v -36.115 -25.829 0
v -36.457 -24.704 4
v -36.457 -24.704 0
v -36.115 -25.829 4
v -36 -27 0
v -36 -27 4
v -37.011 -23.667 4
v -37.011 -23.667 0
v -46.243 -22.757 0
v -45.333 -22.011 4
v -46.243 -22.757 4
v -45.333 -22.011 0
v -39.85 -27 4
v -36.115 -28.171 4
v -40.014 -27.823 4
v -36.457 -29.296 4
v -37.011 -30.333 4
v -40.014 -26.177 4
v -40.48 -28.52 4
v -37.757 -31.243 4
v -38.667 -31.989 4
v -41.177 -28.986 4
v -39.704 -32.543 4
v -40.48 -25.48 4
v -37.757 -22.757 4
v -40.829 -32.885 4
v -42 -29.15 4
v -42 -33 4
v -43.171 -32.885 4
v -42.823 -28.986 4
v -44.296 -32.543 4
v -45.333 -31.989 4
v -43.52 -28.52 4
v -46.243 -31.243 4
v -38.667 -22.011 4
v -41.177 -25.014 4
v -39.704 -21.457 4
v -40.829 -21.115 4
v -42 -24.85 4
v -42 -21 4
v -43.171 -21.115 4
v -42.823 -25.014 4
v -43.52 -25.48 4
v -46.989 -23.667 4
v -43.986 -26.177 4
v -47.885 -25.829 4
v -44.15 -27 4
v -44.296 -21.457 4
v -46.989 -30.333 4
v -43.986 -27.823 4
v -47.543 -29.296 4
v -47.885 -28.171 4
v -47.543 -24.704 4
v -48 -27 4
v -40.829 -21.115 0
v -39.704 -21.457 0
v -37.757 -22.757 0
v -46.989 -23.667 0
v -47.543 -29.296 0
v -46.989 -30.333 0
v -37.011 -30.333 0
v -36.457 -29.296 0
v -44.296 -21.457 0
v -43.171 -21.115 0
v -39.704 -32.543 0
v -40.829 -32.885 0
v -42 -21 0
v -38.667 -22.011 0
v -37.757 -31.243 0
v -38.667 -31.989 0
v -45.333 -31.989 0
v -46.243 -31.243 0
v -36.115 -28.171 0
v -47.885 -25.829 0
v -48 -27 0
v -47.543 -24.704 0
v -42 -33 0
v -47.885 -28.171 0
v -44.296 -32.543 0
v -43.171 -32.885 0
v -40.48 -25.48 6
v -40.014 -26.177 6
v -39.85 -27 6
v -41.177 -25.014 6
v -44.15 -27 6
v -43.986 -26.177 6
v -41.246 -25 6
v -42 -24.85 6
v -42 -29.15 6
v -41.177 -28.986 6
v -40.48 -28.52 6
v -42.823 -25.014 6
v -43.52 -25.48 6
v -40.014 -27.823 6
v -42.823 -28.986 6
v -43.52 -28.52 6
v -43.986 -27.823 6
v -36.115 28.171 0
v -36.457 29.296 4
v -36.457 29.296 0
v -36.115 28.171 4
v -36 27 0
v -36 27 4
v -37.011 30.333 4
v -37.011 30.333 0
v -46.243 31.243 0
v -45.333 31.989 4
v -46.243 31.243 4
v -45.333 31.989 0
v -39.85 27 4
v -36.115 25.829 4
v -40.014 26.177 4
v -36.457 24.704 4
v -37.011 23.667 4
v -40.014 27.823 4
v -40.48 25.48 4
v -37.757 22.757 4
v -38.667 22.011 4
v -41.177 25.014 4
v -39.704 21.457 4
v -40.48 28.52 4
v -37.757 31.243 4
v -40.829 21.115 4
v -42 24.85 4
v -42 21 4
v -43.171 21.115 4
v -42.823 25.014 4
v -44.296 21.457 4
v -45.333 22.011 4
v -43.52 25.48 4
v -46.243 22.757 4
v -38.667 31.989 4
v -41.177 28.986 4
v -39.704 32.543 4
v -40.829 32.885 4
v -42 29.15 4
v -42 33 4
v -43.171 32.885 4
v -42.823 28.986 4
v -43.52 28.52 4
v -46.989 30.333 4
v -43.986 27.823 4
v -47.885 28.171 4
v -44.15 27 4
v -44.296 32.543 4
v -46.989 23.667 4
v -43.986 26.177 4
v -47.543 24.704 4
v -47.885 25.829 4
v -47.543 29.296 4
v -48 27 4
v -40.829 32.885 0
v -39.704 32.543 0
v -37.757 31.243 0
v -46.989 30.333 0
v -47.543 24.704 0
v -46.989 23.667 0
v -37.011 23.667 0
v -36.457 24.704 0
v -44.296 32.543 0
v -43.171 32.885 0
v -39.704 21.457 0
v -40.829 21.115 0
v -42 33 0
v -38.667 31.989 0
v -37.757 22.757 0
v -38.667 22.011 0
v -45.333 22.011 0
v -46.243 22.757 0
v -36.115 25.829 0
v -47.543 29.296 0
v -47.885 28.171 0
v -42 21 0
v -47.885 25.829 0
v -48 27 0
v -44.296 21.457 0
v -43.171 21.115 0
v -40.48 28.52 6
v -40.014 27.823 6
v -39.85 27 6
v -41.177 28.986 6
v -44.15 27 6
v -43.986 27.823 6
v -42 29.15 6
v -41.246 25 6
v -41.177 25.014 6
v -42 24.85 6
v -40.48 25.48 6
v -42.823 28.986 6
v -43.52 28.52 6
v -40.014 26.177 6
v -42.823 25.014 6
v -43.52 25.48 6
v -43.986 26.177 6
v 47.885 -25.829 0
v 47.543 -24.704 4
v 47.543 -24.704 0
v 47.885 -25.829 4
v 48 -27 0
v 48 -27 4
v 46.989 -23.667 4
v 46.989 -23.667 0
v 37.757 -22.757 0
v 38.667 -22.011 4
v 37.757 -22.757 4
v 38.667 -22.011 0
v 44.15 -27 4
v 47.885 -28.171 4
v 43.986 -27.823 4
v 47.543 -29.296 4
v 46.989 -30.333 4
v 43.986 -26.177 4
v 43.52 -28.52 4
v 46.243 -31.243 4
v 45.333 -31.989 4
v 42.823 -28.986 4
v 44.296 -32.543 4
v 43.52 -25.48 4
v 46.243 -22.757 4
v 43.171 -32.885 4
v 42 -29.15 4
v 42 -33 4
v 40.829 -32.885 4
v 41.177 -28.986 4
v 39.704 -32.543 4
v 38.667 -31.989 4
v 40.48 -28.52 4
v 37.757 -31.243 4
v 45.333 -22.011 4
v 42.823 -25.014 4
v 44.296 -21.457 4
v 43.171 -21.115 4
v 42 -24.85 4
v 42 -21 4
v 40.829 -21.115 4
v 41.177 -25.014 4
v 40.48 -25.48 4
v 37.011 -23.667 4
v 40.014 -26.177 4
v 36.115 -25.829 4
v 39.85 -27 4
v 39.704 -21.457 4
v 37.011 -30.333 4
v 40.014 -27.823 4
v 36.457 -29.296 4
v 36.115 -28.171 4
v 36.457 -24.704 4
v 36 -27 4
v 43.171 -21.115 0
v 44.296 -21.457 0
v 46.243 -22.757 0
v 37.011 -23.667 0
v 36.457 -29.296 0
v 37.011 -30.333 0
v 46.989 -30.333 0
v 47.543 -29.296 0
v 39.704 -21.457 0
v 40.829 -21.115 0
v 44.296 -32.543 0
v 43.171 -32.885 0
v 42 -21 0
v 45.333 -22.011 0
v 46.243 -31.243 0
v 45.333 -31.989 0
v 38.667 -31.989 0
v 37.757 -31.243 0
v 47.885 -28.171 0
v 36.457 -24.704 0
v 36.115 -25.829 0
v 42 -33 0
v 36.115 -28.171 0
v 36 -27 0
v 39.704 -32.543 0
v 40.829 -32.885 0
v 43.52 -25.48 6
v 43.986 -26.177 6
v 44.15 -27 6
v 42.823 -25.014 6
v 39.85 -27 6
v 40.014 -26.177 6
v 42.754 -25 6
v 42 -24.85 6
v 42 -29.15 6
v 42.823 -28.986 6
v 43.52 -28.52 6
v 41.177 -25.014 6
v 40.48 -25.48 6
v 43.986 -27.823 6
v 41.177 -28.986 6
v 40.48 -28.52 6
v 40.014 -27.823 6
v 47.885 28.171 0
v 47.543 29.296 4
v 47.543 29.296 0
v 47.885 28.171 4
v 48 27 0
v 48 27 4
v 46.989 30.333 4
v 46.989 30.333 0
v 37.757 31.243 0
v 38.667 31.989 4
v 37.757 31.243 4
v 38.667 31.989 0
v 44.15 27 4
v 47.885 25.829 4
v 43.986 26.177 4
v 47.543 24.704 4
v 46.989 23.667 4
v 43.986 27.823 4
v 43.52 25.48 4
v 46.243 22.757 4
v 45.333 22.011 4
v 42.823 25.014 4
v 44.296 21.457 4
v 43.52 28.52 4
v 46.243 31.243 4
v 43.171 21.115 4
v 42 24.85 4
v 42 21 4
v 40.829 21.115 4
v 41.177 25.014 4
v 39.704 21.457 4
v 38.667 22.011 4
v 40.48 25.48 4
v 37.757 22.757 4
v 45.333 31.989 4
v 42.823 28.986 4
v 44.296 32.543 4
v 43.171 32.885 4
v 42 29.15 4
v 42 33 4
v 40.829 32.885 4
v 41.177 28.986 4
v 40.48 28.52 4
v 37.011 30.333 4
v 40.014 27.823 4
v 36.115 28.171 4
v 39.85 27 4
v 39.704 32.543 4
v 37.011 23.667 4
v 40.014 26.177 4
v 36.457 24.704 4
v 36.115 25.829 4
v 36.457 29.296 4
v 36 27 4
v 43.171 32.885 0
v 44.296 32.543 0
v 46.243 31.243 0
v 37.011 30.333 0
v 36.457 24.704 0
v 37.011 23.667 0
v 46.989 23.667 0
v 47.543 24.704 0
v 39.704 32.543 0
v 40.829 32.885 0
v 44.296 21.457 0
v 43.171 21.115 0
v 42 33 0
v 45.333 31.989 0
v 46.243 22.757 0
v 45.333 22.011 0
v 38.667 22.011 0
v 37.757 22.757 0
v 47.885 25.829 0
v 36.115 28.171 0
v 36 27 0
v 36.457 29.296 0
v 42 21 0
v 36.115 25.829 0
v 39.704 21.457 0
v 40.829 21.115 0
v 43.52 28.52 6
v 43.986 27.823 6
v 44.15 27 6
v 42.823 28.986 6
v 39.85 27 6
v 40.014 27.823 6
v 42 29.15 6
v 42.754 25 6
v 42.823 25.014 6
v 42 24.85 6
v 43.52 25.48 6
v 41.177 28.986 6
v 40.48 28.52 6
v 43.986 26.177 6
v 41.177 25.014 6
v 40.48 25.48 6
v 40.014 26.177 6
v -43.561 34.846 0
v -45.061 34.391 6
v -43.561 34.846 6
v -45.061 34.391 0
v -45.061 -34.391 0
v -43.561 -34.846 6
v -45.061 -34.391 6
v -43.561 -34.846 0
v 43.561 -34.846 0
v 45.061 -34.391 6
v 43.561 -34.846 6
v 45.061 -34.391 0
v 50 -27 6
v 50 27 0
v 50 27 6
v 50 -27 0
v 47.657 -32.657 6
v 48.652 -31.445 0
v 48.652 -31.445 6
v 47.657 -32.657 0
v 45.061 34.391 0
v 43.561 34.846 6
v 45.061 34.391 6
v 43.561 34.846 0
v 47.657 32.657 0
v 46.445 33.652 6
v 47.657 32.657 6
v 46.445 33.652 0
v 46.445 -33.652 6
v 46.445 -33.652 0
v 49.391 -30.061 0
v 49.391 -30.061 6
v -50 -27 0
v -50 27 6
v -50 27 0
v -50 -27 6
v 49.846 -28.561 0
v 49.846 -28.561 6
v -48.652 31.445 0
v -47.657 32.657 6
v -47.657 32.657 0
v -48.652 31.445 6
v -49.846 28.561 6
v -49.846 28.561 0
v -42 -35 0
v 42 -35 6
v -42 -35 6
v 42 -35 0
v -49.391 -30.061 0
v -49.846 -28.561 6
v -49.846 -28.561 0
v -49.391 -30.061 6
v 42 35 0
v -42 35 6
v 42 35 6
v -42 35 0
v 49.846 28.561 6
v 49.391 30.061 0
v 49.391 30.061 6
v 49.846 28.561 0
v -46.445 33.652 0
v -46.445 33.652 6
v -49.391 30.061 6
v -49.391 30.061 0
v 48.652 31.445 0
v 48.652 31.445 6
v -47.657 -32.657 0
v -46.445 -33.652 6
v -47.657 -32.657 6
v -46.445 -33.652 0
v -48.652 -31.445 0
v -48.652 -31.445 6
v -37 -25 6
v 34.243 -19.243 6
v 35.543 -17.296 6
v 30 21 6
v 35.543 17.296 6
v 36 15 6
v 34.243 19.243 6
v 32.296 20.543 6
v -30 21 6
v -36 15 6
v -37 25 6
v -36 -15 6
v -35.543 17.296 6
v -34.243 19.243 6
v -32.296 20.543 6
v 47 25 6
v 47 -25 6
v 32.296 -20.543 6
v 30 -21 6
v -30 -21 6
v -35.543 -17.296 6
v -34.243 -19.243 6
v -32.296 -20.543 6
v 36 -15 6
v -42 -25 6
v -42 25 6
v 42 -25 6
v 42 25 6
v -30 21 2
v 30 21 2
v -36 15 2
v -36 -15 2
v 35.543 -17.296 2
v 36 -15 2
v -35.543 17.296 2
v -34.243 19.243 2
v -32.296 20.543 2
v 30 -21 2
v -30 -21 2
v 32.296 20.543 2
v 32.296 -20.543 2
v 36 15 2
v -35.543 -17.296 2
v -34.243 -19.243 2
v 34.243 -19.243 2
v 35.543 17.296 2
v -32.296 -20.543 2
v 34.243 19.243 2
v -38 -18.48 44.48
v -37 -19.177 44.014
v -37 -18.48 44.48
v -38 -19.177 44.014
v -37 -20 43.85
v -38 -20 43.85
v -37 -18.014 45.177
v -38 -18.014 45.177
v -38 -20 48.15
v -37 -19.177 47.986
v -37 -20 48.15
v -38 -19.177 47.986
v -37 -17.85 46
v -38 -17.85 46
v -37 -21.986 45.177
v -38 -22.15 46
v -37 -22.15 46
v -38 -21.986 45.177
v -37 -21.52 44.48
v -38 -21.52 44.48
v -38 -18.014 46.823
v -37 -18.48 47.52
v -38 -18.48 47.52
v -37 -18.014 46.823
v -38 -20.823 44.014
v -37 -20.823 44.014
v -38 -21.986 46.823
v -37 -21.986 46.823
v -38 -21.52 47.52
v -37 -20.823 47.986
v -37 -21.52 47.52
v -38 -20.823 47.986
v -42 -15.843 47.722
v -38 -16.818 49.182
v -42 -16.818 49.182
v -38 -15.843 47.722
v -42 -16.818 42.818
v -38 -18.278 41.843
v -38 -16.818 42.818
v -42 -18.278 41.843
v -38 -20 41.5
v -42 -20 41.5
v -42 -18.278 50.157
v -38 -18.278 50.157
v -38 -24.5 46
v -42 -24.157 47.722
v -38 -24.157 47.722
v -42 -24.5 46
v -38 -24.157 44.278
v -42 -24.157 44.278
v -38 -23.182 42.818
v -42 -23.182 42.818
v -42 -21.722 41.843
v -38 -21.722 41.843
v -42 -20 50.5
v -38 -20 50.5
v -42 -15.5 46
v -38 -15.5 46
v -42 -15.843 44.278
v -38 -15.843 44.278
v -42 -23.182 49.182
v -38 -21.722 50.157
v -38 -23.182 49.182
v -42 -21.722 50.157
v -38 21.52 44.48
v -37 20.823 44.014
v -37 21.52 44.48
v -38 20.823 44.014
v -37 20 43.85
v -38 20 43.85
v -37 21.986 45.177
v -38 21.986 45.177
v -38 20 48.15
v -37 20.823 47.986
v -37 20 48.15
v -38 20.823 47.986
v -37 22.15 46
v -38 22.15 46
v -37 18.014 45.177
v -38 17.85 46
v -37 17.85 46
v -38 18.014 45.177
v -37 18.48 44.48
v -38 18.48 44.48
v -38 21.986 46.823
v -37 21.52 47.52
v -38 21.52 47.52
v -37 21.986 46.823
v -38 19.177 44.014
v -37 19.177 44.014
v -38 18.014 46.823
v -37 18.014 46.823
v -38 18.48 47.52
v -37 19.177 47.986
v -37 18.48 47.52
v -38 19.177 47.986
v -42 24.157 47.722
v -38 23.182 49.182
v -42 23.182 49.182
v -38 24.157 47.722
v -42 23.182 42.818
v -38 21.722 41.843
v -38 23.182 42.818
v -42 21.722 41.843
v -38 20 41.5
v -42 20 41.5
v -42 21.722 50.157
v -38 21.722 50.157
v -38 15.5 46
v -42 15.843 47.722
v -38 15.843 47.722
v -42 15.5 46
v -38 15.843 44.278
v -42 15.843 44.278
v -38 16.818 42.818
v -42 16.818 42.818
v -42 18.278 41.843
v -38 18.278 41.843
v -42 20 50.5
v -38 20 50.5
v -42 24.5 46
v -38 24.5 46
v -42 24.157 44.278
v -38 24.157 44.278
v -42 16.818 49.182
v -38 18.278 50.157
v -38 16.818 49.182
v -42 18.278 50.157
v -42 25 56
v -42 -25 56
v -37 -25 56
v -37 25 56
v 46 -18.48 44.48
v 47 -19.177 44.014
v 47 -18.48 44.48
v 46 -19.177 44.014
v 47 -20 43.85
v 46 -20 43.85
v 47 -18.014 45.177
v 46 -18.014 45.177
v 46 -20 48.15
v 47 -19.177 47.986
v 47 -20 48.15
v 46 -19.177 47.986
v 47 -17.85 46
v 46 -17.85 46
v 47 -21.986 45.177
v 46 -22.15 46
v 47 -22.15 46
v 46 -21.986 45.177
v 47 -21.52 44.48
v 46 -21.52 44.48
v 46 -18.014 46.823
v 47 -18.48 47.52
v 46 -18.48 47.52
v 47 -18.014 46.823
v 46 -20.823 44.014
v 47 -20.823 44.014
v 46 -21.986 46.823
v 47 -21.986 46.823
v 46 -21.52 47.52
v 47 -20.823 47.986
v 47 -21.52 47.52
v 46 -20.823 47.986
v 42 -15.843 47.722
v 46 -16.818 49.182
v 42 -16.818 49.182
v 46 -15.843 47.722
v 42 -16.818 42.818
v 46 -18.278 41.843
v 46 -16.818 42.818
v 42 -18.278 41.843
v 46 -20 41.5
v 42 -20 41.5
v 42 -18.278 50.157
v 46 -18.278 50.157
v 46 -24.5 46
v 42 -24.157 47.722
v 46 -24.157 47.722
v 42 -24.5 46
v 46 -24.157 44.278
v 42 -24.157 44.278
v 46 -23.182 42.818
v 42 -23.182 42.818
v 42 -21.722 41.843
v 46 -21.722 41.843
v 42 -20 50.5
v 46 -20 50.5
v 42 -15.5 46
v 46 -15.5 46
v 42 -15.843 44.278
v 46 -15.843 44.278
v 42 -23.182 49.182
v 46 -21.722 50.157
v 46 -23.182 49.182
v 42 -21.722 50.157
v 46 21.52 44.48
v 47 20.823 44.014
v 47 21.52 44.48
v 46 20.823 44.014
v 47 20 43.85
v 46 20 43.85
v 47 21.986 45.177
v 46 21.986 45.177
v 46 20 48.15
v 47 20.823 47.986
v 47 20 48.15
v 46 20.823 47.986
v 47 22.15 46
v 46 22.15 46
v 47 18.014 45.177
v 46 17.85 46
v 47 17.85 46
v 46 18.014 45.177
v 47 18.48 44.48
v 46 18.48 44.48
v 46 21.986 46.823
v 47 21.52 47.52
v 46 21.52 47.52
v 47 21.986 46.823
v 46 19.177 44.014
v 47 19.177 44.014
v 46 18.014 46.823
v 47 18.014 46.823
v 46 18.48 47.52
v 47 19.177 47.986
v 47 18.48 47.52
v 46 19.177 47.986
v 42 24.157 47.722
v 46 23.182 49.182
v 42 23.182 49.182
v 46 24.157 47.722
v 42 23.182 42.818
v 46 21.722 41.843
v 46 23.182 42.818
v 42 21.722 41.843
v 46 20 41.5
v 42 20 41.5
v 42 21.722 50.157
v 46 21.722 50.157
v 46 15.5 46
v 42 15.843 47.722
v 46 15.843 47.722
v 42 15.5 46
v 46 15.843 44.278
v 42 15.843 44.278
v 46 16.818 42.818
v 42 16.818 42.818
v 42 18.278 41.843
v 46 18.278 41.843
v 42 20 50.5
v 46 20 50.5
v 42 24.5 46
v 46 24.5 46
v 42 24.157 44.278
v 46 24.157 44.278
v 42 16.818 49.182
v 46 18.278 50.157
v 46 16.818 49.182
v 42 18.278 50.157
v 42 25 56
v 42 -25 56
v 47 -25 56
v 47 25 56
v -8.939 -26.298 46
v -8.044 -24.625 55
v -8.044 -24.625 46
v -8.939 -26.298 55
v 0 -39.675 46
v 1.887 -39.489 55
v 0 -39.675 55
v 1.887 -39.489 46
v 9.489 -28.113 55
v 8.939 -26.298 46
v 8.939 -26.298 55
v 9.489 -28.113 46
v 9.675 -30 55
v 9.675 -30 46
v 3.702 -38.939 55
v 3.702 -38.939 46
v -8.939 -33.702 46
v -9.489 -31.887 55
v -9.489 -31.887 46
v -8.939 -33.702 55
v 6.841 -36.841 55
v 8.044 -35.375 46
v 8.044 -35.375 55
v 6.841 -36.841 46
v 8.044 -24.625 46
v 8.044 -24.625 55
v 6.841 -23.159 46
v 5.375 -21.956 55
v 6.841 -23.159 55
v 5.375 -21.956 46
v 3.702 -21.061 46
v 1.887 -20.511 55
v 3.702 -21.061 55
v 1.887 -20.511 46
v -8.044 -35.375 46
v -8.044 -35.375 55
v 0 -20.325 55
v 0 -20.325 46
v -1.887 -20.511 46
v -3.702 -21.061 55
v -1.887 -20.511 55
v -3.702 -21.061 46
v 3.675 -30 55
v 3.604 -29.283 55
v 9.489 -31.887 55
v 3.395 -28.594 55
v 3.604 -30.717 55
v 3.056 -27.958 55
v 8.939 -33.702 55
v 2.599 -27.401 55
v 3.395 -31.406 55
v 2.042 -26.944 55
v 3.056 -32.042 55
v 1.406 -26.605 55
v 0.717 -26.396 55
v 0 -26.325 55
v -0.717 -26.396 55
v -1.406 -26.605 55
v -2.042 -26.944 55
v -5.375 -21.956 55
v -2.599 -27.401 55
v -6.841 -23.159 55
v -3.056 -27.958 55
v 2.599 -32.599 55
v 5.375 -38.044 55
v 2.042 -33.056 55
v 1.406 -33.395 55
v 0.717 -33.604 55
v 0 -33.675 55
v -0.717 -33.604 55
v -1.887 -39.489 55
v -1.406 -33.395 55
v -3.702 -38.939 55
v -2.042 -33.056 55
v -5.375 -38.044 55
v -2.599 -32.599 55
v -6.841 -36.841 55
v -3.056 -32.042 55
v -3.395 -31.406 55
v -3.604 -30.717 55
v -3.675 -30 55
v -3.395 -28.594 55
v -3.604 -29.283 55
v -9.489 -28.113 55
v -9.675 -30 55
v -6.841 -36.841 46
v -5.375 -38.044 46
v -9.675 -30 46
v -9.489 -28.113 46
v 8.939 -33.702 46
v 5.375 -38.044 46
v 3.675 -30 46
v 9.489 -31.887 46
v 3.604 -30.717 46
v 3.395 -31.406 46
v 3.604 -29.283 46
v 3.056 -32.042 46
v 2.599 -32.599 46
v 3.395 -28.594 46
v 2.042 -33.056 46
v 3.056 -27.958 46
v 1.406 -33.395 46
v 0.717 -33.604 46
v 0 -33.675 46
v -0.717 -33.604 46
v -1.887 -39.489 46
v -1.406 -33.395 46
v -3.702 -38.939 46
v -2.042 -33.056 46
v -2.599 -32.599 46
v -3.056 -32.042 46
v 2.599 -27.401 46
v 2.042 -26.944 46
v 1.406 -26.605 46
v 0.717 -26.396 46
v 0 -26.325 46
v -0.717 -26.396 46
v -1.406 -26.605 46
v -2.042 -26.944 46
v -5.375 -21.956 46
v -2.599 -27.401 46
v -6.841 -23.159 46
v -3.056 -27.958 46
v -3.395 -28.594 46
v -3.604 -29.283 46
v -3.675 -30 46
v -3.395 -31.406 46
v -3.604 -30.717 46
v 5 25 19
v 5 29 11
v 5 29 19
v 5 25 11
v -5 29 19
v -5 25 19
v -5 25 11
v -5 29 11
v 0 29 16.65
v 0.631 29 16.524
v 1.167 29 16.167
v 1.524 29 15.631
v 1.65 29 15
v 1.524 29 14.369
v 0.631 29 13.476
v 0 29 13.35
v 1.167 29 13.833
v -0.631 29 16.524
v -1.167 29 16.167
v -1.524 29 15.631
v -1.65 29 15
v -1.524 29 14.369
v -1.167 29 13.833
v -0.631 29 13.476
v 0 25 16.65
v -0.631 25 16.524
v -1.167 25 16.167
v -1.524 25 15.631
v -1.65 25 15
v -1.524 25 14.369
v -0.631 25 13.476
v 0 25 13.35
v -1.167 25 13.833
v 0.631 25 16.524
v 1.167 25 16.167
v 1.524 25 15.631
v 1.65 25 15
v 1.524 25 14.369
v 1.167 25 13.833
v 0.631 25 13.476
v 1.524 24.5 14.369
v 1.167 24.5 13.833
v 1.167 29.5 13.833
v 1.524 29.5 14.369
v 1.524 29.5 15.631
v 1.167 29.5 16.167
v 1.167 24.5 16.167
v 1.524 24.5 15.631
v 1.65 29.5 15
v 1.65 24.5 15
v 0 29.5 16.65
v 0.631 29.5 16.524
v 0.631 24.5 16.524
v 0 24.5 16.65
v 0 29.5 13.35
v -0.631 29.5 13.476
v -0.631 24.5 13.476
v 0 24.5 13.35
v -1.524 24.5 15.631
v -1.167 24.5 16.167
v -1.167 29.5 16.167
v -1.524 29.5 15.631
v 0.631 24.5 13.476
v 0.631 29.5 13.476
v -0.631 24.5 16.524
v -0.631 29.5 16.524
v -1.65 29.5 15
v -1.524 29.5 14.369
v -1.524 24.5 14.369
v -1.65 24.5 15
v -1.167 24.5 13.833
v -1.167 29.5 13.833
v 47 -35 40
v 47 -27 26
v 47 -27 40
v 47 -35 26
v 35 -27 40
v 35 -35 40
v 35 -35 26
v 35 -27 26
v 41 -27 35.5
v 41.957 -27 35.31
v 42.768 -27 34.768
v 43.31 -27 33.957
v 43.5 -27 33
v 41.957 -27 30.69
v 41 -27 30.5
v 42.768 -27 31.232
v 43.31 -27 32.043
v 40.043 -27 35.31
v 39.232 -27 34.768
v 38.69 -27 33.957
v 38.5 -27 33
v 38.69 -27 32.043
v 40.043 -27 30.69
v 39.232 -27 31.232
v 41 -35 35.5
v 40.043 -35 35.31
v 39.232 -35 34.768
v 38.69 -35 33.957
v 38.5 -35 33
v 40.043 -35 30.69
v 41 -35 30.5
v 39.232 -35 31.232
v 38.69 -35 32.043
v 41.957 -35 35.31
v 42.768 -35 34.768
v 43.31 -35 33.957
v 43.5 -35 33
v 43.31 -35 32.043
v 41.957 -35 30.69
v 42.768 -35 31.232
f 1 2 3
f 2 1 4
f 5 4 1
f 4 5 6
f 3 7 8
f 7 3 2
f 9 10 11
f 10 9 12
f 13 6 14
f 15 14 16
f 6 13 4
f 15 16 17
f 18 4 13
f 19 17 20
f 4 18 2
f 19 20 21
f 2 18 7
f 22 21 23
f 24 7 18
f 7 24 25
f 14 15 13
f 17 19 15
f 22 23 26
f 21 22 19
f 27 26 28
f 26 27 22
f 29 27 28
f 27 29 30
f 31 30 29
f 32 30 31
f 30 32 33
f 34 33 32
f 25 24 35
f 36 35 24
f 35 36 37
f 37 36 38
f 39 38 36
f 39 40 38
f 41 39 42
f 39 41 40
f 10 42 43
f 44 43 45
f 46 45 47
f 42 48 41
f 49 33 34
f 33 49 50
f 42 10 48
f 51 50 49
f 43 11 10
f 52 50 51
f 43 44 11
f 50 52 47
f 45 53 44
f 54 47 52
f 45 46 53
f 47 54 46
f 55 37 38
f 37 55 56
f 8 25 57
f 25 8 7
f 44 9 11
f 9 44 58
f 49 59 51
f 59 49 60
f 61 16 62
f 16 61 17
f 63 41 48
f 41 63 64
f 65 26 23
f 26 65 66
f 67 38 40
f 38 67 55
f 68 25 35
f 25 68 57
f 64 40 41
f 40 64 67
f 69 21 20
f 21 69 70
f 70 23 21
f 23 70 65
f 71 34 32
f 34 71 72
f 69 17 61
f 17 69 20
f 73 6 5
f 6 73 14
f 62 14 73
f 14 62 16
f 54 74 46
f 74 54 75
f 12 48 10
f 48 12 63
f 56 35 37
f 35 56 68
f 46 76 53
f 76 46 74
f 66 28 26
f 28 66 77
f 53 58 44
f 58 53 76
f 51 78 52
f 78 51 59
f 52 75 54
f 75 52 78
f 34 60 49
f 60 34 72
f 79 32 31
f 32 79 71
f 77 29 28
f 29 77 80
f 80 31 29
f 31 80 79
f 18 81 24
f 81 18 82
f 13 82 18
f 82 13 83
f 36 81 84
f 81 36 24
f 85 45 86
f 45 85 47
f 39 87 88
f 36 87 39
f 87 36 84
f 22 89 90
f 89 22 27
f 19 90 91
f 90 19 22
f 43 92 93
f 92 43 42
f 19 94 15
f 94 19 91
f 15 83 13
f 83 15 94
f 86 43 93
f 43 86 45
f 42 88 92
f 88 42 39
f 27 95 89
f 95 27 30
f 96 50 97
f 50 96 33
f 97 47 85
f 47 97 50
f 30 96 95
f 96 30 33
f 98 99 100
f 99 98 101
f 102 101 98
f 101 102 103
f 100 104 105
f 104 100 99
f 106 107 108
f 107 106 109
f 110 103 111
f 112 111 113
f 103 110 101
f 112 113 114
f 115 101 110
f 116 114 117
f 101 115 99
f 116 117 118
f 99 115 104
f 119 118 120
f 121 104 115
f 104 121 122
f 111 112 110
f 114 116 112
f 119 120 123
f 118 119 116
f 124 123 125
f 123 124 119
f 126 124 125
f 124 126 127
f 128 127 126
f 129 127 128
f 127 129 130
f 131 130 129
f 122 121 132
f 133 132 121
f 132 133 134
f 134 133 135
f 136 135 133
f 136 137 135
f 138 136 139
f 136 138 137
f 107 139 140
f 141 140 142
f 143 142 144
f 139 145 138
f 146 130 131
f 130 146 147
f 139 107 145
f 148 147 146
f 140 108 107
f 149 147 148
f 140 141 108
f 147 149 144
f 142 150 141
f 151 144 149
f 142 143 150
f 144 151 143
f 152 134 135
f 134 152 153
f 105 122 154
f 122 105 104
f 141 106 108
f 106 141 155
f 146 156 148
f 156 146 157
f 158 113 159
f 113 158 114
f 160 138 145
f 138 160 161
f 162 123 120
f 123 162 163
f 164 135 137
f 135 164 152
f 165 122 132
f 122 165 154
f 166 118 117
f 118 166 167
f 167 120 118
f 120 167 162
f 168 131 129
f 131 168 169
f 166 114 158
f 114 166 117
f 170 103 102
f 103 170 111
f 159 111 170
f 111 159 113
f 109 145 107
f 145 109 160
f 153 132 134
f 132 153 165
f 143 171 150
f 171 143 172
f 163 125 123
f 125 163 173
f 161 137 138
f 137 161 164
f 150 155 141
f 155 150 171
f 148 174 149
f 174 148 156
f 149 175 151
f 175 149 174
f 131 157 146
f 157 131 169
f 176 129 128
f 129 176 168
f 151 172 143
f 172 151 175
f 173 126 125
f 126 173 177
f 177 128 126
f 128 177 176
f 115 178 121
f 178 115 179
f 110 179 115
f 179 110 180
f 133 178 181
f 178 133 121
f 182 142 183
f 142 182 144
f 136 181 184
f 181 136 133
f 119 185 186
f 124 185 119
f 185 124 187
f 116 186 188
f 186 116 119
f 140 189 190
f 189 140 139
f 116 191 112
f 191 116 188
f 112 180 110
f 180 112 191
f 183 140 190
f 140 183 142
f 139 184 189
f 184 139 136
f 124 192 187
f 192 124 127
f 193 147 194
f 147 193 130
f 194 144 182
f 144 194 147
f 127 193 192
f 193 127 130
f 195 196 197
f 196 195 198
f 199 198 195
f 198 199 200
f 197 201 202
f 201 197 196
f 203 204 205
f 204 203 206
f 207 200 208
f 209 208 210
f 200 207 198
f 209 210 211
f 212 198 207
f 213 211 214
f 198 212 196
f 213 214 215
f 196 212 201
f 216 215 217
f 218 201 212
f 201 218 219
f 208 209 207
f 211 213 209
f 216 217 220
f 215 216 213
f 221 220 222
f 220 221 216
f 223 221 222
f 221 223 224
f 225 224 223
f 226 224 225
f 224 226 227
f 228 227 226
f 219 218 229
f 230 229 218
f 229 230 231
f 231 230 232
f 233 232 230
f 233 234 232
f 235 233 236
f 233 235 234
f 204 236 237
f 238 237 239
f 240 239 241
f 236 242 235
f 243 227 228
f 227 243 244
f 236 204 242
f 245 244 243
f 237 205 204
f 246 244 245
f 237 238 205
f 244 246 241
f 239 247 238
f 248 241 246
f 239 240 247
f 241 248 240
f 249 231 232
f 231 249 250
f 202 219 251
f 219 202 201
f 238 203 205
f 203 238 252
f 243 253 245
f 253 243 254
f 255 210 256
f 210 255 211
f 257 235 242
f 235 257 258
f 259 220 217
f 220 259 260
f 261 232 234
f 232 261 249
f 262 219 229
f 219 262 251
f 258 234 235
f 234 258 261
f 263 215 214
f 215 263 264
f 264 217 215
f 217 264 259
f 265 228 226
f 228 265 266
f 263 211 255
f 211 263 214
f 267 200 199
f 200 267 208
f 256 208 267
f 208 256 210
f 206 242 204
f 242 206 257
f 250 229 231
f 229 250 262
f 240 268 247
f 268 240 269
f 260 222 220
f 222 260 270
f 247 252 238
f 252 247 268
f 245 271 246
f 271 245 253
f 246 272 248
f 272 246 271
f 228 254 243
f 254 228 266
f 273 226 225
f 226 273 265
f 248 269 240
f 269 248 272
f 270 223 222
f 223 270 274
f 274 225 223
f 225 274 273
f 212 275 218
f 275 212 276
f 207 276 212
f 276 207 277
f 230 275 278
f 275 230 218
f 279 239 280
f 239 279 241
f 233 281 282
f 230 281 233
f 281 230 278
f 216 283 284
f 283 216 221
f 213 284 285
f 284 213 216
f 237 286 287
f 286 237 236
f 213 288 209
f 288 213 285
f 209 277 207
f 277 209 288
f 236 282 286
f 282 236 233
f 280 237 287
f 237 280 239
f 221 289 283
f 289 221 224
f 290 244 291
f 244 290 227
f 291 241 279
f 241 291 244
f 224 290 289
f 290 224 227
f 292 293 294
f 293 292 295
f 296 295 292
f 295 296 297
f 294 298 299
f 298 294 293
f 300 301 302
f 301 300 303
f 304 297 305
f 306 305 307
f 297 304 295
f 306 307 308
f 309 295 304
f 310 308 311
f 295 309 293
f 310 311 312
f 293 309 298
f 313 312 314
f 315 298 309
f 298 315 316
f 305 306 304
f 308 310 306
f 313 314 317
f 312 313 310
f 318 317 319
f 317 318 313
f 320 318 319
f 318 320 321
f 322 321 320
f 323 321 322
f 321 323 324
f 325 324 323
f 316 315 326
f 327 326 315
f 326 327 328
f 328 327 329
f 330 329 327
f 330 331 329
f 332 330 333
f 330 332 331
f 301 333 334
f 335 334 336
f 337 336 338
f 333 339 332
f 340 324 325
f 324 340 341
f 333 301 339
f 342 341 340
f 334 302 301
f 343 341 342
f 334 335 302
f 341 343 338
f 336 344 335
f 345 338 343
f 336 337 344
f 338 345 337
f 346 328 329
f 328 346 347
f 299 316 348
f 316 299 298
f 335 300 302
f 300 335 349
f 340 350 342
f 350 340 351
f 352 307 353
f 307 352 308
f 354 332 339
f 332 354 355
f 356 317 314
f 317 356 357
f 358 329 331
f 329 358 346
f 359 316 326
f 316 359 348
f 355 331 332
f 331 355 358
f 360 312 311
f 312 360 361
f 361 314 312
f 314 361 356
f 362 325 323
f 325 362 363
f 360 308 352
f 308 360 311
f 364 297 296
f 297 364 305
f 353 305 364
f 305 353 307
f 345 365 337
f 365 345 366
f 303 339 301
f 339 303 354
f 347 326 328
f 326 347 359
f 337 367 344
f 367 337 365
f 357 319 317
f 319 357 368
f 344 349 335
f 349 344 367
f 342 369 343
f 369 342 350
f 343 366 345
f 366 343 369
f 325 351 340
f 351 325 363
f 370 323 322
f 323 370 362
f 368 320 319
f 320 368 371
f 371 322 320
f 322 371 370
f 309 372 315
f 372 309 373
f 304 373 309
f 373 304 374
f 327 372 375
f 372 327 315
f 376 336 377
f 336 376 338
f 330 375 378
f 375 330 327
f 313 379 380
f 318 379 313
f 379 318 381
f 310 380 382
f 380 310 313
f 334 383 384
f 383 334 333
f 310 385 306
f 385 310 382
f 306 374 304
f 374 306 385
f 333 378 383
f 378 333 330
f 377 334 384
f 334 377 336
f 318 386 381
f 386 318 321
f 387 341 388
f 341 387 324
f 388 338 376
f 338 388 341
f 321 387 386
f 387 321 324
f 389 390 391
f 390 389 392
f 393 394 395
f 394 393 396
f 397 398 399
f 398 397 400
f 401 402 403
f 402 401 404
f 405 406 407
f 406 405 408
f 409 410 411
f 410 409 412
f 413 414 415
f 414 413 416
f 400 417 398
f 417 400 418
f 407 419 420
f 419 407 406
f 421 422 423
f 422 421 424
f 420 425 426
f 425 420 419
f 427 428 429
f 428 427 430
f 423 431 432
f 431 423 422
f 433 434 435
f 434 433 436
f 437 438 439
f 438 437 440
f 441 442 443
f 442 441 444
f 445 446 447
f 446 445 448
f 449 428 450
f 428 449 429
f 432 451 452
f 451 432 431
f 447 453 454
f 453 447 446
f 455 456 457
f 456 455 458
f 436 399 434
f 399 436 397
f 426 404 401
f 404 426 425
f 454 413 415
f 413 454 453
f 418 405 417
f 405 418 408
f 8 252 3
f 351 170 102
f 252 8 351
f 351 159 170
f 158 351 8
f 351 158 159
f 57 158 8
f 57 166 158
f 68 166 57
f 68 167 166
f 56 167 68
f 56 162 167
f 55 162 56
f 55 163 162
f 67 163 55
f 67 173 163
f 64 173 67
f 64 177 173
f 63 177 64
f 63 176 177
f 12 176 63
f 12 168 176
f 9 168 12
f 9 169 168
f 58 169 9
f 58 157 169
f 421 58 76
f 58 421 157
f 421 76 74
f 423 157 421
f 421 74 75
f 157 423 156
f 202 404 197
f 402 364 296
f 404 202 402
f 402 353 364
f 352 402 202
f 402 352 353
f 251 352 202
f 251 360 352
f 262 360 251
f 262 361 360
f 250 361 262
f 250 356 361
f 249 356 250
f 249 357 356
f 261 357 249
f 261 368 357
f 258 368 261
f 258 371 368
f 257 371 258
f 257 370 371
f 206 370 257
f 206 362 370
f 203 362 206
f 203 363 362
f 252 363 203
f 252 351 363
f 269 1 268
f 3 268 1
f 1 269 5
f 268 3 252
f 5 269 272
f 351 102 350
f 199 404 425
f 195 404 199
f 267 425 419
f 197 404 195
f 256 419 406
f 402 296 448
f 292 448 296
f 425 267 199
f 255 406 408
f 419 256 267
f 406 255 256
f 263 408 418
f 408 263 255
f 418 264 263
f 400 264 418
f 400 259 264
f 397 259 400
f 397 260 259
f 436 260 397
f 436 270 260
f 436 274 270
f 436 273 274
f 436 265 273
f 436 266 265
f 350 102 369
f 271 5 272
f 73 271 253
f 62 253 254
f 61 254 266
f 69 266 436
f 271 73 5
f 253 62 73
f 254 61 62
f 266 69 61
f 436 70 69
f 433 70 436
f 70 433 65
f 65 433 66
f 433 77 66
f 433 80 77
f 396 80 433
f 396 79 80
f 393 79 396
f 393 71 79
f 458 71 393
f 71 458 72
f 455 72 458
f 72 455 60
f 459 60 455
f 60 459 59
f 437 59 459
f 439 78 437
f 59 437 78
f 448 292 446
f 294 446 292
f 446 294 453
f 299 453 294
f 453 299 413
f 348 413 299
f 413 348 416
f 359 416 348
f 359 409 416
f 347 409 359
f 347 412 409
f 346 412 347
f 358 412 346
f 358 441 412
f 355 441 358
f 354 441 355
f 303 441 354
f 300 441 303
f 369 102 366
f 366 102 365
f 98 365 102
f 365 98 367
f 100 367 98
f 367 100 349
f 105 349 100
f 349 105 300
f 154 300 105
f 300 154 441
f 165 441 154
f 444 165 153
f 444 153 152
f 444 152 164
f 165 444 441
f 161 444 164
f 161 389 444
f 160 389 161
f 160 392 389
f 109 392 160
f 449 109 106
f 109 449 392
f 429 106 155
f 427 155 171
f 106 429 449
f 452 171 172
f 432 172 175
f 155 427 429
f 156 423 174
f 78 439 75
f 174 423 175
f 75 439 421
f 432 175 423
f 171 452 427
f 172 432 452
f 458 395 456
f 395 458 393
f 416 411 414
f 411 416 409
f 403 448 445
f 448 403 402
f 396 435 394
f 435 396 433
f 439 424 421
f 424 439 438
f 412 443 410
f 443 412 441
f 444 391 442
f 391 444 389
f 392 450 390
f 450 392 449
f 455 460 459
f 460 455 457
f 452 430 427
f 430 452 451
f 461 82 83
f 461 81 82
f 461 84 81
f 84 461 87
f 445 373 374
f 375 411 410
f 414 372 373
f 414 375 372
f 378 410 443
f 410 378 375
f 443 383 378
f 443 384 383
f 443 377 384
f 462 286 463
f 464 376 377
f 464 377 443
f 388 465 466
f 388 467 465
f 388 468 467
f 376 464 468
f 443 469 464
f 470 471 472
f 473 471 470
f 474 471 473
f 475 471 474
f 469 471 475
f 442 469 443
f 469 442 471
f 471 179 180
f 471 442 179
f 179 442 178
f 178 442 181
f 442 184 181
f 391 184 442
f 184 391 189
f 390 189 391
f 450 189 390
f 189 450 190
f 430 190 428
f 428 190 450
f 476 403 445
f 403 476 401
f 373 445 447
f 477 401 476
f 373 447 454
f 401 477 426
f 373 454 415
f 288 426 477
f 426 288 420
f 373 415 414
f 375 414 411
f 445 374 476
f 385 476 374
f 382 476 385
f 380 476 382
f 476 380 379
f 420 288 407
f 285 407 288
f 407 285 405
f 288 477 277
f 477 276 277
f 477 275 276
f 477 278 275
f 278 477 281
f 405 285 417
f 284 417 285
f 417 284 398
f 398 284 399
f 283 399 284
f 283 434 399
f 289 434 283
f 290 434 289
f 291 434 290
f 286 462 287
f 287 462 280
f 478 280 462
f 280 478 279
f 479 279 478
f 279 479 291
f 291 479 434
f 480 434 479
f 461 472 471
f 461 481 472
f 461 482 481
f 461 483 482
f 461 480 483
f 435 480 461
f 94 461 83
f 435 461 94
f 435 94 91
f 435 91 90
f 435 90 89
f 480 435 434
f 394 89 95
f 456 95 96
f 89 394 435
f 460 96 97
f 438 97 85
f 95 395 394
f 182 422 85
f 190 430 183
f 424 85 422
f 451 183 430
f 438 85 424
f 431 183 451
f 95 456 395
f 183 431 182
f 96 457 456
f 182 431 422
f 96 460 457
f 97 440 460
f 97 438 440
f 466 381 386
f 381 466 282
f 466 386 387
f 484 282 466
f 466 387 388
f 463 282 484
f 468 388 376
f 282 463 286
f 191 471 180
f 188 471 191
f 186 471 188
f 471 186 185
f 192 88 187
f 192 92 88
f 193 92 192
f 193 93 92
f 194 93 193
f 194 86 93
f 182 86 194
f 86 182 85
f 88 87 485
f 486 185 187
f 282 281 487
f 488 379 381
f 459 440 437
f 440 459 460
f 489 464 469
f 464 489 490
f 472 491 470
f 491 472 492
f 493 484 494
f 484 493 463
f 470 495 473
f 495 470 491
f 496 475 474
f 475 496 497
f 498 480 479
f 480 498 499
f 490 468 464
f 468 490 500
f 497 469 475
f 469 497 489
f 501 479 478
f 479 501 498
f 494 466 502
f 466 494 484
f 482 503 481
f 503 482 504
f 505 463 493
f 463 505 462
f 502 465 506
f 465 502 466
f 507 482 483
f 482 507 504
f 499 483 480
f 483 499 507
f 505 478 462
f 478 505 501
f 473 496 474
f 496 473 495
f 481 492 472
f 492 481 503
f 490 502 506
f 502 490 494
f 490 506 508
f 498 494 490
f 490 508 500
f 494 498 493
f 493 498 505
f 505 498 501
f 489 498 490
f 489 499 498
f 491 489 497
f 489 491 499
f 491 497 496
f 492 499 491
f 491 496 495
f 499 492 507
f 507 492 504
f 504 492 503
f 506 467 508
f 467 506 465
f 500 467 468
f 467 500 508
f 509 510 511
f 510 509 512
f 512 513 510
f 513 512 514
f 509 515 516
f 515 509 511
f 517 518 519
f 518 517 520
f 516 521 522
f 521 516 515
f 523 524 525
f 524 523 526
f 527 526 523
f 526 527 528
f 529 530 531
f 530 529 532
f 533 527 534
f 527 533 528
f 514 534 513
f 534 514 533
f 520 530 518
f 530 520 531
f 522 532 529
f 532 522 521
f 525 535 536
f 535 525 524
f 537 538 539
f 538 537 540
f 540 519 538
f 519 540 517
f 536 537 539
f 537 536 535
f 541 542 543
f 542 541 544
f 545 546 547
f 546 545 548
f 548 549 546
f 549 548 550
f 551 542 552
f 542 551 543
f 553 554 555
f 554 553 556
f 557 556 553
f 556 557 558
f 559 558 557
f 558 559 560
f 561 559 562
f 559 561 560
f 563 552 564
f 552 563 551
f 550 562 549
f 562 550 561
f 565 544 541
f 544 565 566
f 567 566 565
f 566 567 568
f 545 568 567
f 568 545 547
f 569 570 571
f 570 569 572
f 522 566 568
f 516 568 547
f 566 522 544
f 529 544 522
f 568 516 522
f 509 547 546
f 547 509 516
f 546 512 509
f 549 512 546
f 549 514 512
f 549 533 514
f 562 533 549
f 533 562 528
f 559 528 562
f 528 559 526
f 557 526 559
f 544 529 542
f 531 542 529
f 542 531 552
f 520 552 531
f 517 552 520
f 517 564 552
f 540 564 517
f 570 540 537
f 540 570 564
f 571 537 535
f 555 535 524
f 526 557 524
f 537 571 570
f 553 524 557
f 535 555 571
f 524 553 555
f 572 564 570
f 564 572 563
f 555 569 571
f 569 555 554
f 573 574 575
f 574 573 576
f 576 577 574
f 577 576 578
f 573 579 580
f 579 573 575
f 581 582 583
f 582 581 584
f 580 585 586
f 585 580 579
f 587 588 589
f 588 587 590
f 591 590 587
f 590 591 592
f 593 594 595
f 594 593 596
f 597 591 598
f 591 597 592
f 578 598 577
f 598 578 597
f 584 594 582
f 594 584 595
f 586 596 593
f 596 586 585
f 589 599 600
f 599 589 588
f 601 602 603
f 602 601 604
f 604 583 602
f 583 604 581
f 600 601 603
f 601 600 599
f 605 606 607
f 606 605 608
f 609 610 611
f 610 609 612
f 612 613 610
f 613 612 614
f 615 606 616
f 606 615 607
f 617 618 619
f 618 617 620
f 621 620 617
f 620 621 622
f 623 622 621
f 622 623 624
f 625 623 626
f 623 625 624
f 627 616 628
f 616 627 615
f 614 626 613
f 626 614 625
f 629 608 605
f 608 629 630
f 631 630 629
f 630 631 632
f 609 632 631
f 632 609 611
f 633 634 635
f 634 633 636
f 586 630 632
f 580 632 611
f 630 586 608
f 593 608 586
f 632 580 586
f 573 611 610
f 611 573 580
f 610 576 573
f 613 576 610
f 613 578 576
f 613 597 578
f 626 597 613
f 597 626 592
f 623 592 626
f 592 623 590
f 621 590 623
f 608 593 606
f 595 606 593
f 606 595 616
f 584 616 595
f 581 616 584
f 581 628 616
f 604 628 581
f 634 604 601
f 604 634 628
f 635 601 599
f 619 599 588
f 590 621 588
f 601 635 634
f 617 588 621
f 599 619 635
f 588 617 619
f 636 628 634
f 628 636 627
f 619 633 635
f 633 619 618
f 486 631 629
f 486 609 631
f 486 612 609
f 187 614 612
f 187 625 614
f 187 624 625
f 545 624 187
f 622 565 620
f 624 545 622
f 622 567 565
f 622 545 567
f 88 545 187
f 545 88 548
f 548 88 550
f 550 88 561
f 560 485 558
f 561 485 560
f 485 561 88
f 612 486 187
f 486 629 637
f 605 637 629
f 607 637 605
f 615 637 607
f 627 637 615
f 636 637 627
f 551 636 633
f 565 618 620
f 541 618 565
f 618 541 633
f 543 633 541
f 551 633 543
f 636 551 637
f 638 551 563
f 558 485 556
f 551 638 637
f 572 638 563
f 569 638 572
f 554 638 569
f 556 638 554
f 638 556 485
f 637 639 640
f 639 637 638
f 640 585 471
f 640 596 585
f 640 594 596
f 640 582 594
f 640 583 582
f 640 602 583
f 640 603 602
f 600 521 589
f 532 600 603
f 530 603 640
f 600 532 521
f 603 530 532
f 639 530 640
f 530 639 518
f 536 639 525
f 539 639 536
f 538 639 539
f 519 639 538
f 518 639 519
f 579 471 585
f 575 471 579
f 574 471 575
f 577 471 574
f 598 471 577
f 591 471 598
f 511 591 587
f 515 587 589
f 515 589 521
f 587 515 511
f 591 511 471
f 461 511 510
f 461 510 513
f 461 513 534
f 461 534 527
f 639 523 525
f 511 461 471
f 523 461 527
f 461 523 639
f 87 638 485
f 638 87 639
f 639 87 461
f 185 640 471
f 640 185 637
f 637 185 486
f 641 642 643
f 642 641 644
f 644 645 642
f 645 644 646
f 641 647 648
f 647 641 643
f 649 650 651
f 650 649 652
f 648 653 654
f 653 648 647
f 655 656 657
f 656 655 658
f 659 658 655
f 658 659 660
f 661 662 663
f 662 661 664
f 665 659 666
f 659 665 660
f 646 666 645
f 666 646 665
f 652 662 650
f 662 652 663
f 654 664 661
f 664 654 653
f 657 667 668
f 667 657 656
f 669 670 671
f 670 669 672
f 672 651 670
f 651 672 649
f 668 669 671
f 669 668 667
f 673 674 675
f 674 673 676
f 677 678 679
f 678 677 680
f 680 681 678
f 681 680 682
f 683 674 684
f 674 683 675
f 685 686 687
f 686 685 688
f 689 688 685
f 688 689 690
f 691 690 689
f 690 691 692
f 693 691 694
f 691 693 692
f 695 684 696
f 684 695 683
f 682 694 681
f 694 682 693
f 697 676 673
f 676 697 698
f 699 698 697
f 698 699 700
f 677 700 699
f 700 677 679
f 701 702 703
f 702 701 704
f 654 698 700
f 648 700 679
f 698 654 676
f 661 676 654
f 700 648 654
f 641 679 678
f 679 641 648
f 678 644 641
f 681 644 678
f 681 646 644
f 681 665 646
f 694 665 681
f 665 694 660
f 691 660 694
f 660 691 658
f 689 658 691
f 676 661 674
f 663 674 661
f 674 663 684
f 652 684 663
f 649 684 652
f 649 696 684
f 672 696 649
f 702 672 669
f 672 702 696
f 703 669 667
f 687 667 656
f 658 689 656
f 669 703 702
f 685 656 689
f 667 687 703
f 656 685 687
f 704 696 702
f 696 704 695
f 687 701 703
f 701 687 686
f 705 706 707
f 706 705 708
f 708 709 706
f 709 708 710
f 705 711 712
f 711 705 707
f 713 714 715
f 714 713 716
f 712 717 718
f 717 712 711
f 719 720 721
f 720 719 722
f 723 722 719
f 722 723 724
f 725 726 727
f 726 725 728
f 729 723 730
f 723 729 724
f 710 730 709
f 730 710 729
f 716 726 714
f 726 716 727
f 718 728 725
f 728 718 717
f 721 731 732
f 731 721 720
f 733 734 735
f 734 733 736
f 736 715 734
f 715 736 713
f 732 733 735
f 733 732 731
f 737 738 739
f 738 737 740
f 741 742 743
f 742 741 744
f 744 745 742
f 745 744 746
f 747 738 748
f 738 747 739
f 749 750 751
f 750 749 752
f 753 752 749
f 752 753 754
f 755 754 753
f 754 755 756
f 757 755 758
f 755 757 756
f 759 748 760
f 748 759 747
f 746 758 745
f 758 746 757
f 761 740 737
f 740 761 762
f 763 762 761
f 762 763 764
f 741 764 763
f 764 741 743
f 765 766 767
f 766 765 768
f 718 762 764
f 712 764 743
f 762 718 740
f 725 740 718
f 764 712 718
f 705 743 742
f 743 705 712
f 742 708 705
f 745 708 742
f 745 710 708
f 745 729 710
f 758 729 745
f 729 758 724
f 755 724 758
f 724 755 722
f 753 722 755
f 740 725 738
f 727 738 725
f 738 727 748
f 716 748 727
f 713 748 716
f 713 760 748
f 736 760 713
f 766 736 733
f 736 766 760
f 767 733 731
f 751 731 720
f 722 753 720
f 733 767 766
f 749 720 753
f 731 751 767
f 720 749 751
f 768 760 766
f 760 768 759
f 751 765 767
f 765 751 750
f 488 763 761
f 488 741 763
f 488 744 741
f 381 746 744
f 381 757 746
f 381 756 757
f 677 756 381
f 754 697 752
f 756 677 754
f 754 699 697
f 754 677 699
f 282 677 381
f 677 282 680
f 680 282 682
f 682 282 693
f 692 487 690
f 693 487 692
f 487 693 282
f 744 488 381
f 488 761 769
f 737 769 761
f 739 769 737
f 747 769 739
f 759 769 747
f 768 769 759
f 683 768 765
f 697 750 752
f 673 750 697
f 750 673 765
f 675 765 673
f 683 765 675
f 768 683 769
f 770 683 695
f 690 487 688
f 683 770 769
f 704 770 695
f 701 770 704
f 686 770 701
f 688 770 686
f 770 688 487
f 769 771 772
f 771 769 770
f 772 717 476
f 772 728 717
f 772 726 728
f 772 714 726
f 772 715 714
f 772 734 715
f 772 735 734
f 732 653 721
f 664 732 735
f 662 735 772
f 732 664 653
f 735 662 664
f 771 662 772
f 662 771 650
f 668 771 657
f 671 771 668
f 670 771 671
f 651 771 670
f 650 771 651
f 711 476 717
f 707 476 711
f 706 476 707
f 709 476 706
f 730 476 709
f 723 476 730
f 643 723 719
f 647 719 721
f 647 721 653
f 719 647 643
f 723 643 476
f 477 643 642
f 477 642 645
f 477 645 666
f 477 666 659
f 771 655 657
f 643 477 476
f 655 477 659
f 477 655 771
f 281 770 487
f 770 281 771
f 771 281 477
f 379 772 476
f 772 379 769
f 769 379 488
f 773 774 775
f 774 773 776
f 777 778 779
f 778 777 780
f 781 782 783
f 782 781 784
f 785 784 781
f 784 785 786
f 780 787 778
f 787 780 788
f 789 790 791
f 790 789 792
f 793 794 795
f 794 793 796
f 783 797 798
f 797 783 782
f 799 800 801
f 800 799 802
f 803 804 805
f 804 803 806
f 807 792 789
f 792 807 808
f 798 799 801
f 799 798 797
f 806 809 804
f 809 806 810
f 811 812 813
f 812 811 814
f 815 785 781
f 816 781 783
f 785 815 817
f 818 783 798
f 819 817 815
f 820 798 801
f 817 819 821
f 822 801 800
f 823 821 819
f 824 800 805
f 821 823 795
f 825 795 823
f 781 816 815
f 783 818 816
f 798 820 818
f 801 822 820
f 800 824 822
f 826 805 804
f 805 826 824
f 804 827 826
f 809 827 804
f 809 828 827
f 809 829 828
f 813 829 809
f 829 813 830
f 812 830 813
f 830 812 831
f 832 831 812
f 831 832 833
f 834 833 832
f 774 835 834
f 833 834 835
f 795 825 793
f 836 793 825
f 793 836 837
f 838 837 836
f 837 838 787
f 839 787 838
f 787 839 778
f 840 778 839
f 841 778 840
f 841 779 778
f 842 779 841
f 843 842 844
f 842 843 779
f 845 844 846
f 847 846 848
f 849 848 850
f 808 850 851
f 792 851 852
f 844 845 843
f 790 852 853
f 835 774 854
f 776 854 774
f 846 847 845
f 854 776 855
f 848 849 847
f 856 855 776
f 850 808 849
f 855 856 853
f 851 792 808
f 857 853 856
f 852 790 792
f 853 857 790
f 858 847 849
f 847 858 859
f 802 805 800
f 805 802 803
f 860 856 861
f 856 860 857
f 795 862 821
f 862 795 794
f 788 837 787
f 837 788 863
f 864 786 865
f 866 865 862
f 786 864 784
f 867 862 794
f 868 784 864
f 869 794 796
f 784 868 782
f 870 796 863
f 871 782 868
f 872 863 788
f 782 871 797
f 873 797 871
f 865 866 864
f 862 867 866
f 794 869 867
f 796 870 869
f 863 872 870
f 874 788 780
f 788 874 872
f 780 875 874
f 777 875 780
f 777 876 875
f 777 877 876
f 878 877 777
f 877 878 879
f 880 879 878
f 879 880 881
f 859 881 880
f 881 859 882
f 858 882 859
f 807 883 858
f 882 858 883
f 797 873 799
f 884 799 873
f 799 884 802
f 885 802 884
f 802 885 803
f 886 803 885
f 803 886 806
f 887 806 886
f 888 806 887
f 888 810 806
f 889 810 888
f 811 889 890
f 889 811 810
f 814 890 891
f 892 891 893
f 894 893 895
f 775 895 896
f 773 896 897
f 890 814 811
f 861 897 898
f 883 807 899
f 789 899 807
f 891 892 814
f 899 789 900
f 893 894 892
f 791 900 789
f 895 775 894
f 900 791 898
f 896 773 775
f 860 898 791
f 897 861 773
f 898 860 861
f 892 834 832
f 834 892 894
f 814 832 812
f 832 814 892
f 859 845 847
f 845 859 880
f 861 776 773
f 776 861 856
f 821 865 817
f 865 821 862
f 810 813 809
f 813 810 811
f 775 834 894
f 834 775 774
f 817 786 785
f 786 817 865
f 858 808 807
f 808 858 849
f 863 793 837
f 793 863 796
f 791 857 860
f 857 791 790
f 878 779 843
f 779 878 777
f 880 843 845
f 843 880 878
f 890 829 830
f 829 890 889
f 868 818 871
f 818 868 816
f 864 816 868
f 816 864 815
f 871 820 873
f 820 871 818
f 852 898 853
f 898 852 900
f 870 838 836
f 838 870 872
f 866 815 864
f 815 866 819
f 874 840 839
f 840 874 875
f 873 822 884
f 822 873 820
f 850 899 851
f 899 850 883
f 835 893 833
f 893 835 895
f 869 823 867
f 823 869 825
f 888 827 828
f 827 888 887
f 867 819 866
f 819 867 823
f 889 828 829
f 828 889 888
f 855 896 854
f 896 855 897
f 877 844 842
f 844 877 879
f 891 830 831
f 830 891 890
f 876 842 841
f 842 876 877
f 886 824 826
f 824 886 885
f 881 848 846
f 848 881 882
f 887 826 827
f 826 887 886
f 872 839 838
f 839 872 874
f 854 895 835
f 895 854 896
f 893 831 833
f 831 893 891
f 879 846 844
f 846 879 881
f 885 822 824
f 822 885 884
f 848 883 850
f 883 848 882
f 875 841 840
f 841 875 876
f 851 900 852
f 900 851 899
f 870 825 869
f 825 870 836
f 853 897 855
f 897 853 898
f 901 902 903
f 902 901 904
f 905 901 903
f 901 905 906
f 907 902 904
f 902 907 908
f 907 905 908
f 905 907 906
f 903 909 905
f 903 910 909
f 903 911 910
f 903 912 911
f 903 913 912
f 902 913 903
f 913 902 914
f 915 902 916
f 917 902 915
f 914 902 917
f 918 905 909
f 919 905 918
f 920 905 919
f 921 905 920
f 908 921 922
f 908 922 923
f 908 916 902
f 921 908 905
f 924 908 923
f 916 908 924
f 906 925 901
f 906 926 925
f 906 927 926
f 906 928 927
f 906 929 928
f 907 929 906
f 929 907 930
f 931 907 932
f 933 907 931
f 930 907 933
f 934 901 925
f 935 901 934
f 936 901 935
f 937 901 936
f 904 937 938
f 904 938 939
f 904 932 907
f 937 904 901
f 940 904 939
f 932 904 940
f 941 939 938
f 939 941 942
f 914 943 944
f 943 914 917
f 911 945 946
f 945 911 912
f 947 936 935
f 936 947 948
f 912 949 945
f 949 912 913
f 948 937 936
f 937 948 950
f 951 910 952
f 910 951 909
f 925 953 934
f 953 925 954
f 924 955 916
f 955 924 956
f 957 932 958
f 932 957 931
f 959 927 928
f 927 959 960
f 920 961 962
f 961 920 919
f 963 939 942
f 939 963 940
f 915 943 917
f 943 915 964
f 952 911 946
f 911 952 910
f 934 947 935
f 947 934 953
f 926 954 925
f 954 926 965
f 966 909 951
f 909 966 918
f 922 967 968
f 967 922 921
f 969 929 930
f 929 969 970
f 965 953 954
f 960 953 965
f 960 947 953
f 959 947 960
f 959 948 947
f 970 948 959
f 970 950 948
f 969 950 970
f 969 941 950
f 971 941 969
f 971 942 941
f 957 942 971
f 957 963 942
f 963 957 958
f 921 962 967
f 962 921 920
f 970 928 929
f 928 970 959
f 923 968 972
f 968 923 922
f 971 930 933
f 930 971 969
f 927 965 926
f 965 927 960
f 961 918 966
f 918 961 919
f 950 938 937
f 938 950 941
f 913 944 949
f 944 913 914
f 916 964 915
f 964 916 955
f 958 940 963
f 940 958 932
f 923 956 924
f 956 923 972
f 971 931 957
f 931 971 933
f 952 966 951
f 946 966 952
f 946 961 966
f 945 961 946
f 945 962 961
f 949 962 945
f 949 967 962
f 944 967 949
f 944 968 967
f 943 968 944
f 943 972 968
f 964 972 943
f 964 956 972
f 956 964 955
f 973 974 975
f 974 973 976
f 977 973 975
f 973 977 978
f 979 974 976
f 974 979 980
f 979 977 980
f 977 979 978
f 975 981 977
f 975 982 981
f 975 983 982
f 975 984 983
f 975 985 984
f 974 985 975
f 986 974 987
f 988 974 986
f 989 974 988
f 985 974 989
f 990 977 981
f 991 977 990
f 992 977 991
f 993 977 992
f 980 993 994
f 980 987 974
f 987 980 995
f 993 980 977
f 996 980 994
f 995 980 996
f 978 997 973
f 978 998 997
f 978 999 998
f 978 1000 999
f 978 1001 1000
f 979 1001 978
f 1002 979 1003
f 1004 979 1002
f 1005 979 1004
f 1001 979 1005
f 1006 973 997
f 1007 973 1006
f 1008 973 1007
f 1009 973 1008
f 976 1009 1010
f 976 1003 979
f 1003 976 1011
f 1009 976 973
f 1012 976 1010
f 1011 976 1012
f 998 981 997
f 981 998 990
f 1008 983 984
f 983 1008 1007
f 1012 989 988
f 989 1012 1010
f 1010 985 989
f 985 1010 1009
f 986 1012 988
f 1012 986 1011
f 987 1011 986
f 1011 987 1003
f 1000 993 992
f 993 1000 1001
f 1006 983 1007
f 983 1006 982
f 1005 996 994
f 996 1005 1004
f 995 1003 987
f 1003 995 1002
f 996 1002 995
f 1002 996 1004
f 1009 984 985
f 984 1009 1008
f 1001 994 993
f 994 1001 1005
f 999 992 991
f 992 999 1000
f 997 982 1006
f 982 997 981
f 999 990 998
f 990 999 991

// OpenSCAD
/**
 * cap_mounting_bracket.scad — TM-VCAP-001 Rev A
 * Variable Capacitor Mounting Bracket and Frame Support
 *
 * Accommodates standard amateur radio variable capacitors:
 *   - Frame width: 60–100mm (adjustable)
 *   - Shaft height: 30–50mm from base
 *   - Shaft diameter: 6.35mm (1/4 inch) standard
 *
 * Print settings:
 *   Material:    PETG
 *   Infill:      50% gyroid
 *   Wall:        4 perimeters
 *   Layer:       0.2mm
 *   Orientation: Base flat on bed
 *   Supports:    Yes under shaft collar
 *
 * Print envelope: 120mm × 80mm × 60mm
 *
 * HIGH VOLTAGE NOTE: This bracket contacts the capacitor frame.
 * If the capacitor frame is at RF potential (floating),
 * use nylon M4 standoffs to isolate bracket from chassis.
 */

// ─── Parameters ───────────────────────────────────────────────────────────────

// Capacitor frame dimensions (measure your specific capacitor)
frame_w         = 80.0;    // Frame width (X axis)
frame_d         = 50.0;    // Frame depth (Y axis)
frame_h         = 40.0;    // Frame height from base to shaft centerline
frame_bolt_sp_x = 65.0;    // Bolt hole spacing X (frame mounting bolts)
frame_bolt_sp_y = 40.0;    // Bolt hole spacing Y
frame_bolt_dia  = 4.3;     // M4 clearance hole (4.0mm + 0.3mm)
frame_bolt_head = 8.0;     // M4 head diameter
frame_bolt_hh   = 4.0;     // M4 head height (counterbore)

// Shaft dimensions
shaft_dia       = 6.35;    // 1/4 inch standard
shaft_h         = 40.0;    // Shaft centerline height from bracket base
shaft_bore_dia  = shaft_dia + 1.0;  // Clearance in shaft collar

// Base plate
base_w          = frame_w + 20;
base_d          = frame_d + 20;
base_thick      = 6.0;

// Upright walls
wall_thick      = 5.0;
wall_h          = frame_h + 10;

// Chassis mounting holes (4× M4, for mounting bracket to enclosure floor)
chassis_bolt_sp_x = base_w - 16;
chassis_bolt_sp_y = base_d - 16;
chassis_bolt_dia  = 4.3;

// Vibration isolation (rubber grommet seats)
iso_od          = 12.0;    // Grommet OD
iso_id          = 4.5;     // Grommet ID
iso_depth       = 4.0;     // Counterbore depth for grommet

// Anti-rotation tab
tab_w           = 10.0;
tab_h           = 8.0;
tab_d           = 4.0;

// ─── Modules ──────────────────────────────────────────────────────────────────

module base_plate() {
    difference() {
        // Main base
        hull() {
            for (x=[-1,1]) for (y=[-1,1])
                translate([x*(base_w/2-8), y*(base_d/2-8), 0])
                    cylinder(h=base_thick, r=8, $fn=32);
        }
        // Chassis mounting holes with grommet counterbores
        for (x=[-1,1]) for (y=[-1,1]) {
            translate([x*chassis_bolt_sp_x/2, y*chassis_bolt_sp_y/2, -0.5]) {
                // Grommet seat (from below)
                cylinder(h=iso_depth+0.5, d=iso_od, $fn=32);
                // Through bolt hole
                cylinder(h=base_thick+1, d=chassis_bolt_dia, $fn=16);
            }
        }
        // Weight relief pocket (bottom center)
        translate([0, 0, 2])
            hull() {
                for (x=[-1,1]) for (y=[-1,1])
                    translate([x*(base_w/2-20), y*(base_d/2-20), 0])
                        cylinder(h=base_thick, r=6, $fn=16);
            }
    }
}

module side_walls() {
    wall_offset_x = frame_w/2 + 2;
    // Two side walls supporting the capacitor frame
    for (side=[-1,1]) {
        translate([side*wall_offset_x, 0, base_thick]) {
            difference() {
                // Wall body
                hull() {
                    translate([0, -frame_d/2, 0])
                        cube([wall_thick, frame_d, wall_h], center=false);
                }
                // Frame bolt holes (counterbored)
                for (y=[-1,1]) {
                    translate([-0.5, y*frame_bolt_sp_y/2, frame_h])
                    rotate([0,90,0]) {
                        cylinder(h=wall_thick+1, d=frame_bolt_dia, $fn=16);
                        cylinder(h=frame_bolt_hh+0.5, d=frame_bolt_head+1, $fn=16);
                    }
                }
            }
        }
    }
}

module shaft_collar() {
    // Raised collar at shaft height to prevent lateral shaft flex
    translate([0, -frame_d/2 - wall_thick, base_thick + frame_h])
    difference() {
        cylinder(h=wall_thick+4, d=shaft_bore_dia+12, $fn=32);
        translate([0,0,-0.5])
            cylinder(h=wall_thick+5, d=shaft_bore_dia, $fn=32);
    }
}

module anti_rotation_tab() {
    // Prevents capacitor frame from rotating about shaft axis
    translate([-tab_w/2, frame_d/2, base_thick + 5])
        cube([tab_w, tab_d, tab_h]);
    // Slot in tab for set screw
    translate([0, frame_d/2 + tab_d/2, base_thick + 5 + tab_h/2])
    rotate([90,0,0])
        cylinder(h=tab_d+1, d=3.3, $fn=16, center=true);
}

module cable_guide() {
    // Route flexible wiper wire away from RF field
    // Clip on back wall
    translate([base_w/2 - 15, -base_d/2, base_thick + 20])
    difference() {
        cube([12, 8, 14], center=false);
        translate([6, -0.5, 7])
        rotate([-90,0,0])
            cylinder(h=9, d=5, $fn=16);
        translate([6, 3, 7])
        rotate([-90,0,0])
            cylinder(h=5, d=3, $fn=16);
    }
}

// ─── Full Assembly ─────────────────────────────────────────────────────────────

module cap_mounting_bracket() {
    union() {
        base_plate();
        side_walls();
        shaft_collar();
        anti_rotation_tab();
        cable_guide();
    }
}

// ─── Render ───────────────────────────────────────────────────────────────────

$fn = 32;
cap_mounting_bracket();

// ─── Notes ────────────────────────────────────────────────────────────────────
// Assembly:
// 1. Insert M4 nylon grommets (McMaster 90131A151) into chassis bolt counterbores
// 2. Mount bracket to enclosure floor with M4×12 screws through grommets
// 3. Set capacitor frame on side wall ledges, secure with M4×8 screws
// 4. Route wiper wire through cable guide to RF terminal
// 5. If frame is at RF potential, use M4 nylon insulating washers at ALL mounting points
